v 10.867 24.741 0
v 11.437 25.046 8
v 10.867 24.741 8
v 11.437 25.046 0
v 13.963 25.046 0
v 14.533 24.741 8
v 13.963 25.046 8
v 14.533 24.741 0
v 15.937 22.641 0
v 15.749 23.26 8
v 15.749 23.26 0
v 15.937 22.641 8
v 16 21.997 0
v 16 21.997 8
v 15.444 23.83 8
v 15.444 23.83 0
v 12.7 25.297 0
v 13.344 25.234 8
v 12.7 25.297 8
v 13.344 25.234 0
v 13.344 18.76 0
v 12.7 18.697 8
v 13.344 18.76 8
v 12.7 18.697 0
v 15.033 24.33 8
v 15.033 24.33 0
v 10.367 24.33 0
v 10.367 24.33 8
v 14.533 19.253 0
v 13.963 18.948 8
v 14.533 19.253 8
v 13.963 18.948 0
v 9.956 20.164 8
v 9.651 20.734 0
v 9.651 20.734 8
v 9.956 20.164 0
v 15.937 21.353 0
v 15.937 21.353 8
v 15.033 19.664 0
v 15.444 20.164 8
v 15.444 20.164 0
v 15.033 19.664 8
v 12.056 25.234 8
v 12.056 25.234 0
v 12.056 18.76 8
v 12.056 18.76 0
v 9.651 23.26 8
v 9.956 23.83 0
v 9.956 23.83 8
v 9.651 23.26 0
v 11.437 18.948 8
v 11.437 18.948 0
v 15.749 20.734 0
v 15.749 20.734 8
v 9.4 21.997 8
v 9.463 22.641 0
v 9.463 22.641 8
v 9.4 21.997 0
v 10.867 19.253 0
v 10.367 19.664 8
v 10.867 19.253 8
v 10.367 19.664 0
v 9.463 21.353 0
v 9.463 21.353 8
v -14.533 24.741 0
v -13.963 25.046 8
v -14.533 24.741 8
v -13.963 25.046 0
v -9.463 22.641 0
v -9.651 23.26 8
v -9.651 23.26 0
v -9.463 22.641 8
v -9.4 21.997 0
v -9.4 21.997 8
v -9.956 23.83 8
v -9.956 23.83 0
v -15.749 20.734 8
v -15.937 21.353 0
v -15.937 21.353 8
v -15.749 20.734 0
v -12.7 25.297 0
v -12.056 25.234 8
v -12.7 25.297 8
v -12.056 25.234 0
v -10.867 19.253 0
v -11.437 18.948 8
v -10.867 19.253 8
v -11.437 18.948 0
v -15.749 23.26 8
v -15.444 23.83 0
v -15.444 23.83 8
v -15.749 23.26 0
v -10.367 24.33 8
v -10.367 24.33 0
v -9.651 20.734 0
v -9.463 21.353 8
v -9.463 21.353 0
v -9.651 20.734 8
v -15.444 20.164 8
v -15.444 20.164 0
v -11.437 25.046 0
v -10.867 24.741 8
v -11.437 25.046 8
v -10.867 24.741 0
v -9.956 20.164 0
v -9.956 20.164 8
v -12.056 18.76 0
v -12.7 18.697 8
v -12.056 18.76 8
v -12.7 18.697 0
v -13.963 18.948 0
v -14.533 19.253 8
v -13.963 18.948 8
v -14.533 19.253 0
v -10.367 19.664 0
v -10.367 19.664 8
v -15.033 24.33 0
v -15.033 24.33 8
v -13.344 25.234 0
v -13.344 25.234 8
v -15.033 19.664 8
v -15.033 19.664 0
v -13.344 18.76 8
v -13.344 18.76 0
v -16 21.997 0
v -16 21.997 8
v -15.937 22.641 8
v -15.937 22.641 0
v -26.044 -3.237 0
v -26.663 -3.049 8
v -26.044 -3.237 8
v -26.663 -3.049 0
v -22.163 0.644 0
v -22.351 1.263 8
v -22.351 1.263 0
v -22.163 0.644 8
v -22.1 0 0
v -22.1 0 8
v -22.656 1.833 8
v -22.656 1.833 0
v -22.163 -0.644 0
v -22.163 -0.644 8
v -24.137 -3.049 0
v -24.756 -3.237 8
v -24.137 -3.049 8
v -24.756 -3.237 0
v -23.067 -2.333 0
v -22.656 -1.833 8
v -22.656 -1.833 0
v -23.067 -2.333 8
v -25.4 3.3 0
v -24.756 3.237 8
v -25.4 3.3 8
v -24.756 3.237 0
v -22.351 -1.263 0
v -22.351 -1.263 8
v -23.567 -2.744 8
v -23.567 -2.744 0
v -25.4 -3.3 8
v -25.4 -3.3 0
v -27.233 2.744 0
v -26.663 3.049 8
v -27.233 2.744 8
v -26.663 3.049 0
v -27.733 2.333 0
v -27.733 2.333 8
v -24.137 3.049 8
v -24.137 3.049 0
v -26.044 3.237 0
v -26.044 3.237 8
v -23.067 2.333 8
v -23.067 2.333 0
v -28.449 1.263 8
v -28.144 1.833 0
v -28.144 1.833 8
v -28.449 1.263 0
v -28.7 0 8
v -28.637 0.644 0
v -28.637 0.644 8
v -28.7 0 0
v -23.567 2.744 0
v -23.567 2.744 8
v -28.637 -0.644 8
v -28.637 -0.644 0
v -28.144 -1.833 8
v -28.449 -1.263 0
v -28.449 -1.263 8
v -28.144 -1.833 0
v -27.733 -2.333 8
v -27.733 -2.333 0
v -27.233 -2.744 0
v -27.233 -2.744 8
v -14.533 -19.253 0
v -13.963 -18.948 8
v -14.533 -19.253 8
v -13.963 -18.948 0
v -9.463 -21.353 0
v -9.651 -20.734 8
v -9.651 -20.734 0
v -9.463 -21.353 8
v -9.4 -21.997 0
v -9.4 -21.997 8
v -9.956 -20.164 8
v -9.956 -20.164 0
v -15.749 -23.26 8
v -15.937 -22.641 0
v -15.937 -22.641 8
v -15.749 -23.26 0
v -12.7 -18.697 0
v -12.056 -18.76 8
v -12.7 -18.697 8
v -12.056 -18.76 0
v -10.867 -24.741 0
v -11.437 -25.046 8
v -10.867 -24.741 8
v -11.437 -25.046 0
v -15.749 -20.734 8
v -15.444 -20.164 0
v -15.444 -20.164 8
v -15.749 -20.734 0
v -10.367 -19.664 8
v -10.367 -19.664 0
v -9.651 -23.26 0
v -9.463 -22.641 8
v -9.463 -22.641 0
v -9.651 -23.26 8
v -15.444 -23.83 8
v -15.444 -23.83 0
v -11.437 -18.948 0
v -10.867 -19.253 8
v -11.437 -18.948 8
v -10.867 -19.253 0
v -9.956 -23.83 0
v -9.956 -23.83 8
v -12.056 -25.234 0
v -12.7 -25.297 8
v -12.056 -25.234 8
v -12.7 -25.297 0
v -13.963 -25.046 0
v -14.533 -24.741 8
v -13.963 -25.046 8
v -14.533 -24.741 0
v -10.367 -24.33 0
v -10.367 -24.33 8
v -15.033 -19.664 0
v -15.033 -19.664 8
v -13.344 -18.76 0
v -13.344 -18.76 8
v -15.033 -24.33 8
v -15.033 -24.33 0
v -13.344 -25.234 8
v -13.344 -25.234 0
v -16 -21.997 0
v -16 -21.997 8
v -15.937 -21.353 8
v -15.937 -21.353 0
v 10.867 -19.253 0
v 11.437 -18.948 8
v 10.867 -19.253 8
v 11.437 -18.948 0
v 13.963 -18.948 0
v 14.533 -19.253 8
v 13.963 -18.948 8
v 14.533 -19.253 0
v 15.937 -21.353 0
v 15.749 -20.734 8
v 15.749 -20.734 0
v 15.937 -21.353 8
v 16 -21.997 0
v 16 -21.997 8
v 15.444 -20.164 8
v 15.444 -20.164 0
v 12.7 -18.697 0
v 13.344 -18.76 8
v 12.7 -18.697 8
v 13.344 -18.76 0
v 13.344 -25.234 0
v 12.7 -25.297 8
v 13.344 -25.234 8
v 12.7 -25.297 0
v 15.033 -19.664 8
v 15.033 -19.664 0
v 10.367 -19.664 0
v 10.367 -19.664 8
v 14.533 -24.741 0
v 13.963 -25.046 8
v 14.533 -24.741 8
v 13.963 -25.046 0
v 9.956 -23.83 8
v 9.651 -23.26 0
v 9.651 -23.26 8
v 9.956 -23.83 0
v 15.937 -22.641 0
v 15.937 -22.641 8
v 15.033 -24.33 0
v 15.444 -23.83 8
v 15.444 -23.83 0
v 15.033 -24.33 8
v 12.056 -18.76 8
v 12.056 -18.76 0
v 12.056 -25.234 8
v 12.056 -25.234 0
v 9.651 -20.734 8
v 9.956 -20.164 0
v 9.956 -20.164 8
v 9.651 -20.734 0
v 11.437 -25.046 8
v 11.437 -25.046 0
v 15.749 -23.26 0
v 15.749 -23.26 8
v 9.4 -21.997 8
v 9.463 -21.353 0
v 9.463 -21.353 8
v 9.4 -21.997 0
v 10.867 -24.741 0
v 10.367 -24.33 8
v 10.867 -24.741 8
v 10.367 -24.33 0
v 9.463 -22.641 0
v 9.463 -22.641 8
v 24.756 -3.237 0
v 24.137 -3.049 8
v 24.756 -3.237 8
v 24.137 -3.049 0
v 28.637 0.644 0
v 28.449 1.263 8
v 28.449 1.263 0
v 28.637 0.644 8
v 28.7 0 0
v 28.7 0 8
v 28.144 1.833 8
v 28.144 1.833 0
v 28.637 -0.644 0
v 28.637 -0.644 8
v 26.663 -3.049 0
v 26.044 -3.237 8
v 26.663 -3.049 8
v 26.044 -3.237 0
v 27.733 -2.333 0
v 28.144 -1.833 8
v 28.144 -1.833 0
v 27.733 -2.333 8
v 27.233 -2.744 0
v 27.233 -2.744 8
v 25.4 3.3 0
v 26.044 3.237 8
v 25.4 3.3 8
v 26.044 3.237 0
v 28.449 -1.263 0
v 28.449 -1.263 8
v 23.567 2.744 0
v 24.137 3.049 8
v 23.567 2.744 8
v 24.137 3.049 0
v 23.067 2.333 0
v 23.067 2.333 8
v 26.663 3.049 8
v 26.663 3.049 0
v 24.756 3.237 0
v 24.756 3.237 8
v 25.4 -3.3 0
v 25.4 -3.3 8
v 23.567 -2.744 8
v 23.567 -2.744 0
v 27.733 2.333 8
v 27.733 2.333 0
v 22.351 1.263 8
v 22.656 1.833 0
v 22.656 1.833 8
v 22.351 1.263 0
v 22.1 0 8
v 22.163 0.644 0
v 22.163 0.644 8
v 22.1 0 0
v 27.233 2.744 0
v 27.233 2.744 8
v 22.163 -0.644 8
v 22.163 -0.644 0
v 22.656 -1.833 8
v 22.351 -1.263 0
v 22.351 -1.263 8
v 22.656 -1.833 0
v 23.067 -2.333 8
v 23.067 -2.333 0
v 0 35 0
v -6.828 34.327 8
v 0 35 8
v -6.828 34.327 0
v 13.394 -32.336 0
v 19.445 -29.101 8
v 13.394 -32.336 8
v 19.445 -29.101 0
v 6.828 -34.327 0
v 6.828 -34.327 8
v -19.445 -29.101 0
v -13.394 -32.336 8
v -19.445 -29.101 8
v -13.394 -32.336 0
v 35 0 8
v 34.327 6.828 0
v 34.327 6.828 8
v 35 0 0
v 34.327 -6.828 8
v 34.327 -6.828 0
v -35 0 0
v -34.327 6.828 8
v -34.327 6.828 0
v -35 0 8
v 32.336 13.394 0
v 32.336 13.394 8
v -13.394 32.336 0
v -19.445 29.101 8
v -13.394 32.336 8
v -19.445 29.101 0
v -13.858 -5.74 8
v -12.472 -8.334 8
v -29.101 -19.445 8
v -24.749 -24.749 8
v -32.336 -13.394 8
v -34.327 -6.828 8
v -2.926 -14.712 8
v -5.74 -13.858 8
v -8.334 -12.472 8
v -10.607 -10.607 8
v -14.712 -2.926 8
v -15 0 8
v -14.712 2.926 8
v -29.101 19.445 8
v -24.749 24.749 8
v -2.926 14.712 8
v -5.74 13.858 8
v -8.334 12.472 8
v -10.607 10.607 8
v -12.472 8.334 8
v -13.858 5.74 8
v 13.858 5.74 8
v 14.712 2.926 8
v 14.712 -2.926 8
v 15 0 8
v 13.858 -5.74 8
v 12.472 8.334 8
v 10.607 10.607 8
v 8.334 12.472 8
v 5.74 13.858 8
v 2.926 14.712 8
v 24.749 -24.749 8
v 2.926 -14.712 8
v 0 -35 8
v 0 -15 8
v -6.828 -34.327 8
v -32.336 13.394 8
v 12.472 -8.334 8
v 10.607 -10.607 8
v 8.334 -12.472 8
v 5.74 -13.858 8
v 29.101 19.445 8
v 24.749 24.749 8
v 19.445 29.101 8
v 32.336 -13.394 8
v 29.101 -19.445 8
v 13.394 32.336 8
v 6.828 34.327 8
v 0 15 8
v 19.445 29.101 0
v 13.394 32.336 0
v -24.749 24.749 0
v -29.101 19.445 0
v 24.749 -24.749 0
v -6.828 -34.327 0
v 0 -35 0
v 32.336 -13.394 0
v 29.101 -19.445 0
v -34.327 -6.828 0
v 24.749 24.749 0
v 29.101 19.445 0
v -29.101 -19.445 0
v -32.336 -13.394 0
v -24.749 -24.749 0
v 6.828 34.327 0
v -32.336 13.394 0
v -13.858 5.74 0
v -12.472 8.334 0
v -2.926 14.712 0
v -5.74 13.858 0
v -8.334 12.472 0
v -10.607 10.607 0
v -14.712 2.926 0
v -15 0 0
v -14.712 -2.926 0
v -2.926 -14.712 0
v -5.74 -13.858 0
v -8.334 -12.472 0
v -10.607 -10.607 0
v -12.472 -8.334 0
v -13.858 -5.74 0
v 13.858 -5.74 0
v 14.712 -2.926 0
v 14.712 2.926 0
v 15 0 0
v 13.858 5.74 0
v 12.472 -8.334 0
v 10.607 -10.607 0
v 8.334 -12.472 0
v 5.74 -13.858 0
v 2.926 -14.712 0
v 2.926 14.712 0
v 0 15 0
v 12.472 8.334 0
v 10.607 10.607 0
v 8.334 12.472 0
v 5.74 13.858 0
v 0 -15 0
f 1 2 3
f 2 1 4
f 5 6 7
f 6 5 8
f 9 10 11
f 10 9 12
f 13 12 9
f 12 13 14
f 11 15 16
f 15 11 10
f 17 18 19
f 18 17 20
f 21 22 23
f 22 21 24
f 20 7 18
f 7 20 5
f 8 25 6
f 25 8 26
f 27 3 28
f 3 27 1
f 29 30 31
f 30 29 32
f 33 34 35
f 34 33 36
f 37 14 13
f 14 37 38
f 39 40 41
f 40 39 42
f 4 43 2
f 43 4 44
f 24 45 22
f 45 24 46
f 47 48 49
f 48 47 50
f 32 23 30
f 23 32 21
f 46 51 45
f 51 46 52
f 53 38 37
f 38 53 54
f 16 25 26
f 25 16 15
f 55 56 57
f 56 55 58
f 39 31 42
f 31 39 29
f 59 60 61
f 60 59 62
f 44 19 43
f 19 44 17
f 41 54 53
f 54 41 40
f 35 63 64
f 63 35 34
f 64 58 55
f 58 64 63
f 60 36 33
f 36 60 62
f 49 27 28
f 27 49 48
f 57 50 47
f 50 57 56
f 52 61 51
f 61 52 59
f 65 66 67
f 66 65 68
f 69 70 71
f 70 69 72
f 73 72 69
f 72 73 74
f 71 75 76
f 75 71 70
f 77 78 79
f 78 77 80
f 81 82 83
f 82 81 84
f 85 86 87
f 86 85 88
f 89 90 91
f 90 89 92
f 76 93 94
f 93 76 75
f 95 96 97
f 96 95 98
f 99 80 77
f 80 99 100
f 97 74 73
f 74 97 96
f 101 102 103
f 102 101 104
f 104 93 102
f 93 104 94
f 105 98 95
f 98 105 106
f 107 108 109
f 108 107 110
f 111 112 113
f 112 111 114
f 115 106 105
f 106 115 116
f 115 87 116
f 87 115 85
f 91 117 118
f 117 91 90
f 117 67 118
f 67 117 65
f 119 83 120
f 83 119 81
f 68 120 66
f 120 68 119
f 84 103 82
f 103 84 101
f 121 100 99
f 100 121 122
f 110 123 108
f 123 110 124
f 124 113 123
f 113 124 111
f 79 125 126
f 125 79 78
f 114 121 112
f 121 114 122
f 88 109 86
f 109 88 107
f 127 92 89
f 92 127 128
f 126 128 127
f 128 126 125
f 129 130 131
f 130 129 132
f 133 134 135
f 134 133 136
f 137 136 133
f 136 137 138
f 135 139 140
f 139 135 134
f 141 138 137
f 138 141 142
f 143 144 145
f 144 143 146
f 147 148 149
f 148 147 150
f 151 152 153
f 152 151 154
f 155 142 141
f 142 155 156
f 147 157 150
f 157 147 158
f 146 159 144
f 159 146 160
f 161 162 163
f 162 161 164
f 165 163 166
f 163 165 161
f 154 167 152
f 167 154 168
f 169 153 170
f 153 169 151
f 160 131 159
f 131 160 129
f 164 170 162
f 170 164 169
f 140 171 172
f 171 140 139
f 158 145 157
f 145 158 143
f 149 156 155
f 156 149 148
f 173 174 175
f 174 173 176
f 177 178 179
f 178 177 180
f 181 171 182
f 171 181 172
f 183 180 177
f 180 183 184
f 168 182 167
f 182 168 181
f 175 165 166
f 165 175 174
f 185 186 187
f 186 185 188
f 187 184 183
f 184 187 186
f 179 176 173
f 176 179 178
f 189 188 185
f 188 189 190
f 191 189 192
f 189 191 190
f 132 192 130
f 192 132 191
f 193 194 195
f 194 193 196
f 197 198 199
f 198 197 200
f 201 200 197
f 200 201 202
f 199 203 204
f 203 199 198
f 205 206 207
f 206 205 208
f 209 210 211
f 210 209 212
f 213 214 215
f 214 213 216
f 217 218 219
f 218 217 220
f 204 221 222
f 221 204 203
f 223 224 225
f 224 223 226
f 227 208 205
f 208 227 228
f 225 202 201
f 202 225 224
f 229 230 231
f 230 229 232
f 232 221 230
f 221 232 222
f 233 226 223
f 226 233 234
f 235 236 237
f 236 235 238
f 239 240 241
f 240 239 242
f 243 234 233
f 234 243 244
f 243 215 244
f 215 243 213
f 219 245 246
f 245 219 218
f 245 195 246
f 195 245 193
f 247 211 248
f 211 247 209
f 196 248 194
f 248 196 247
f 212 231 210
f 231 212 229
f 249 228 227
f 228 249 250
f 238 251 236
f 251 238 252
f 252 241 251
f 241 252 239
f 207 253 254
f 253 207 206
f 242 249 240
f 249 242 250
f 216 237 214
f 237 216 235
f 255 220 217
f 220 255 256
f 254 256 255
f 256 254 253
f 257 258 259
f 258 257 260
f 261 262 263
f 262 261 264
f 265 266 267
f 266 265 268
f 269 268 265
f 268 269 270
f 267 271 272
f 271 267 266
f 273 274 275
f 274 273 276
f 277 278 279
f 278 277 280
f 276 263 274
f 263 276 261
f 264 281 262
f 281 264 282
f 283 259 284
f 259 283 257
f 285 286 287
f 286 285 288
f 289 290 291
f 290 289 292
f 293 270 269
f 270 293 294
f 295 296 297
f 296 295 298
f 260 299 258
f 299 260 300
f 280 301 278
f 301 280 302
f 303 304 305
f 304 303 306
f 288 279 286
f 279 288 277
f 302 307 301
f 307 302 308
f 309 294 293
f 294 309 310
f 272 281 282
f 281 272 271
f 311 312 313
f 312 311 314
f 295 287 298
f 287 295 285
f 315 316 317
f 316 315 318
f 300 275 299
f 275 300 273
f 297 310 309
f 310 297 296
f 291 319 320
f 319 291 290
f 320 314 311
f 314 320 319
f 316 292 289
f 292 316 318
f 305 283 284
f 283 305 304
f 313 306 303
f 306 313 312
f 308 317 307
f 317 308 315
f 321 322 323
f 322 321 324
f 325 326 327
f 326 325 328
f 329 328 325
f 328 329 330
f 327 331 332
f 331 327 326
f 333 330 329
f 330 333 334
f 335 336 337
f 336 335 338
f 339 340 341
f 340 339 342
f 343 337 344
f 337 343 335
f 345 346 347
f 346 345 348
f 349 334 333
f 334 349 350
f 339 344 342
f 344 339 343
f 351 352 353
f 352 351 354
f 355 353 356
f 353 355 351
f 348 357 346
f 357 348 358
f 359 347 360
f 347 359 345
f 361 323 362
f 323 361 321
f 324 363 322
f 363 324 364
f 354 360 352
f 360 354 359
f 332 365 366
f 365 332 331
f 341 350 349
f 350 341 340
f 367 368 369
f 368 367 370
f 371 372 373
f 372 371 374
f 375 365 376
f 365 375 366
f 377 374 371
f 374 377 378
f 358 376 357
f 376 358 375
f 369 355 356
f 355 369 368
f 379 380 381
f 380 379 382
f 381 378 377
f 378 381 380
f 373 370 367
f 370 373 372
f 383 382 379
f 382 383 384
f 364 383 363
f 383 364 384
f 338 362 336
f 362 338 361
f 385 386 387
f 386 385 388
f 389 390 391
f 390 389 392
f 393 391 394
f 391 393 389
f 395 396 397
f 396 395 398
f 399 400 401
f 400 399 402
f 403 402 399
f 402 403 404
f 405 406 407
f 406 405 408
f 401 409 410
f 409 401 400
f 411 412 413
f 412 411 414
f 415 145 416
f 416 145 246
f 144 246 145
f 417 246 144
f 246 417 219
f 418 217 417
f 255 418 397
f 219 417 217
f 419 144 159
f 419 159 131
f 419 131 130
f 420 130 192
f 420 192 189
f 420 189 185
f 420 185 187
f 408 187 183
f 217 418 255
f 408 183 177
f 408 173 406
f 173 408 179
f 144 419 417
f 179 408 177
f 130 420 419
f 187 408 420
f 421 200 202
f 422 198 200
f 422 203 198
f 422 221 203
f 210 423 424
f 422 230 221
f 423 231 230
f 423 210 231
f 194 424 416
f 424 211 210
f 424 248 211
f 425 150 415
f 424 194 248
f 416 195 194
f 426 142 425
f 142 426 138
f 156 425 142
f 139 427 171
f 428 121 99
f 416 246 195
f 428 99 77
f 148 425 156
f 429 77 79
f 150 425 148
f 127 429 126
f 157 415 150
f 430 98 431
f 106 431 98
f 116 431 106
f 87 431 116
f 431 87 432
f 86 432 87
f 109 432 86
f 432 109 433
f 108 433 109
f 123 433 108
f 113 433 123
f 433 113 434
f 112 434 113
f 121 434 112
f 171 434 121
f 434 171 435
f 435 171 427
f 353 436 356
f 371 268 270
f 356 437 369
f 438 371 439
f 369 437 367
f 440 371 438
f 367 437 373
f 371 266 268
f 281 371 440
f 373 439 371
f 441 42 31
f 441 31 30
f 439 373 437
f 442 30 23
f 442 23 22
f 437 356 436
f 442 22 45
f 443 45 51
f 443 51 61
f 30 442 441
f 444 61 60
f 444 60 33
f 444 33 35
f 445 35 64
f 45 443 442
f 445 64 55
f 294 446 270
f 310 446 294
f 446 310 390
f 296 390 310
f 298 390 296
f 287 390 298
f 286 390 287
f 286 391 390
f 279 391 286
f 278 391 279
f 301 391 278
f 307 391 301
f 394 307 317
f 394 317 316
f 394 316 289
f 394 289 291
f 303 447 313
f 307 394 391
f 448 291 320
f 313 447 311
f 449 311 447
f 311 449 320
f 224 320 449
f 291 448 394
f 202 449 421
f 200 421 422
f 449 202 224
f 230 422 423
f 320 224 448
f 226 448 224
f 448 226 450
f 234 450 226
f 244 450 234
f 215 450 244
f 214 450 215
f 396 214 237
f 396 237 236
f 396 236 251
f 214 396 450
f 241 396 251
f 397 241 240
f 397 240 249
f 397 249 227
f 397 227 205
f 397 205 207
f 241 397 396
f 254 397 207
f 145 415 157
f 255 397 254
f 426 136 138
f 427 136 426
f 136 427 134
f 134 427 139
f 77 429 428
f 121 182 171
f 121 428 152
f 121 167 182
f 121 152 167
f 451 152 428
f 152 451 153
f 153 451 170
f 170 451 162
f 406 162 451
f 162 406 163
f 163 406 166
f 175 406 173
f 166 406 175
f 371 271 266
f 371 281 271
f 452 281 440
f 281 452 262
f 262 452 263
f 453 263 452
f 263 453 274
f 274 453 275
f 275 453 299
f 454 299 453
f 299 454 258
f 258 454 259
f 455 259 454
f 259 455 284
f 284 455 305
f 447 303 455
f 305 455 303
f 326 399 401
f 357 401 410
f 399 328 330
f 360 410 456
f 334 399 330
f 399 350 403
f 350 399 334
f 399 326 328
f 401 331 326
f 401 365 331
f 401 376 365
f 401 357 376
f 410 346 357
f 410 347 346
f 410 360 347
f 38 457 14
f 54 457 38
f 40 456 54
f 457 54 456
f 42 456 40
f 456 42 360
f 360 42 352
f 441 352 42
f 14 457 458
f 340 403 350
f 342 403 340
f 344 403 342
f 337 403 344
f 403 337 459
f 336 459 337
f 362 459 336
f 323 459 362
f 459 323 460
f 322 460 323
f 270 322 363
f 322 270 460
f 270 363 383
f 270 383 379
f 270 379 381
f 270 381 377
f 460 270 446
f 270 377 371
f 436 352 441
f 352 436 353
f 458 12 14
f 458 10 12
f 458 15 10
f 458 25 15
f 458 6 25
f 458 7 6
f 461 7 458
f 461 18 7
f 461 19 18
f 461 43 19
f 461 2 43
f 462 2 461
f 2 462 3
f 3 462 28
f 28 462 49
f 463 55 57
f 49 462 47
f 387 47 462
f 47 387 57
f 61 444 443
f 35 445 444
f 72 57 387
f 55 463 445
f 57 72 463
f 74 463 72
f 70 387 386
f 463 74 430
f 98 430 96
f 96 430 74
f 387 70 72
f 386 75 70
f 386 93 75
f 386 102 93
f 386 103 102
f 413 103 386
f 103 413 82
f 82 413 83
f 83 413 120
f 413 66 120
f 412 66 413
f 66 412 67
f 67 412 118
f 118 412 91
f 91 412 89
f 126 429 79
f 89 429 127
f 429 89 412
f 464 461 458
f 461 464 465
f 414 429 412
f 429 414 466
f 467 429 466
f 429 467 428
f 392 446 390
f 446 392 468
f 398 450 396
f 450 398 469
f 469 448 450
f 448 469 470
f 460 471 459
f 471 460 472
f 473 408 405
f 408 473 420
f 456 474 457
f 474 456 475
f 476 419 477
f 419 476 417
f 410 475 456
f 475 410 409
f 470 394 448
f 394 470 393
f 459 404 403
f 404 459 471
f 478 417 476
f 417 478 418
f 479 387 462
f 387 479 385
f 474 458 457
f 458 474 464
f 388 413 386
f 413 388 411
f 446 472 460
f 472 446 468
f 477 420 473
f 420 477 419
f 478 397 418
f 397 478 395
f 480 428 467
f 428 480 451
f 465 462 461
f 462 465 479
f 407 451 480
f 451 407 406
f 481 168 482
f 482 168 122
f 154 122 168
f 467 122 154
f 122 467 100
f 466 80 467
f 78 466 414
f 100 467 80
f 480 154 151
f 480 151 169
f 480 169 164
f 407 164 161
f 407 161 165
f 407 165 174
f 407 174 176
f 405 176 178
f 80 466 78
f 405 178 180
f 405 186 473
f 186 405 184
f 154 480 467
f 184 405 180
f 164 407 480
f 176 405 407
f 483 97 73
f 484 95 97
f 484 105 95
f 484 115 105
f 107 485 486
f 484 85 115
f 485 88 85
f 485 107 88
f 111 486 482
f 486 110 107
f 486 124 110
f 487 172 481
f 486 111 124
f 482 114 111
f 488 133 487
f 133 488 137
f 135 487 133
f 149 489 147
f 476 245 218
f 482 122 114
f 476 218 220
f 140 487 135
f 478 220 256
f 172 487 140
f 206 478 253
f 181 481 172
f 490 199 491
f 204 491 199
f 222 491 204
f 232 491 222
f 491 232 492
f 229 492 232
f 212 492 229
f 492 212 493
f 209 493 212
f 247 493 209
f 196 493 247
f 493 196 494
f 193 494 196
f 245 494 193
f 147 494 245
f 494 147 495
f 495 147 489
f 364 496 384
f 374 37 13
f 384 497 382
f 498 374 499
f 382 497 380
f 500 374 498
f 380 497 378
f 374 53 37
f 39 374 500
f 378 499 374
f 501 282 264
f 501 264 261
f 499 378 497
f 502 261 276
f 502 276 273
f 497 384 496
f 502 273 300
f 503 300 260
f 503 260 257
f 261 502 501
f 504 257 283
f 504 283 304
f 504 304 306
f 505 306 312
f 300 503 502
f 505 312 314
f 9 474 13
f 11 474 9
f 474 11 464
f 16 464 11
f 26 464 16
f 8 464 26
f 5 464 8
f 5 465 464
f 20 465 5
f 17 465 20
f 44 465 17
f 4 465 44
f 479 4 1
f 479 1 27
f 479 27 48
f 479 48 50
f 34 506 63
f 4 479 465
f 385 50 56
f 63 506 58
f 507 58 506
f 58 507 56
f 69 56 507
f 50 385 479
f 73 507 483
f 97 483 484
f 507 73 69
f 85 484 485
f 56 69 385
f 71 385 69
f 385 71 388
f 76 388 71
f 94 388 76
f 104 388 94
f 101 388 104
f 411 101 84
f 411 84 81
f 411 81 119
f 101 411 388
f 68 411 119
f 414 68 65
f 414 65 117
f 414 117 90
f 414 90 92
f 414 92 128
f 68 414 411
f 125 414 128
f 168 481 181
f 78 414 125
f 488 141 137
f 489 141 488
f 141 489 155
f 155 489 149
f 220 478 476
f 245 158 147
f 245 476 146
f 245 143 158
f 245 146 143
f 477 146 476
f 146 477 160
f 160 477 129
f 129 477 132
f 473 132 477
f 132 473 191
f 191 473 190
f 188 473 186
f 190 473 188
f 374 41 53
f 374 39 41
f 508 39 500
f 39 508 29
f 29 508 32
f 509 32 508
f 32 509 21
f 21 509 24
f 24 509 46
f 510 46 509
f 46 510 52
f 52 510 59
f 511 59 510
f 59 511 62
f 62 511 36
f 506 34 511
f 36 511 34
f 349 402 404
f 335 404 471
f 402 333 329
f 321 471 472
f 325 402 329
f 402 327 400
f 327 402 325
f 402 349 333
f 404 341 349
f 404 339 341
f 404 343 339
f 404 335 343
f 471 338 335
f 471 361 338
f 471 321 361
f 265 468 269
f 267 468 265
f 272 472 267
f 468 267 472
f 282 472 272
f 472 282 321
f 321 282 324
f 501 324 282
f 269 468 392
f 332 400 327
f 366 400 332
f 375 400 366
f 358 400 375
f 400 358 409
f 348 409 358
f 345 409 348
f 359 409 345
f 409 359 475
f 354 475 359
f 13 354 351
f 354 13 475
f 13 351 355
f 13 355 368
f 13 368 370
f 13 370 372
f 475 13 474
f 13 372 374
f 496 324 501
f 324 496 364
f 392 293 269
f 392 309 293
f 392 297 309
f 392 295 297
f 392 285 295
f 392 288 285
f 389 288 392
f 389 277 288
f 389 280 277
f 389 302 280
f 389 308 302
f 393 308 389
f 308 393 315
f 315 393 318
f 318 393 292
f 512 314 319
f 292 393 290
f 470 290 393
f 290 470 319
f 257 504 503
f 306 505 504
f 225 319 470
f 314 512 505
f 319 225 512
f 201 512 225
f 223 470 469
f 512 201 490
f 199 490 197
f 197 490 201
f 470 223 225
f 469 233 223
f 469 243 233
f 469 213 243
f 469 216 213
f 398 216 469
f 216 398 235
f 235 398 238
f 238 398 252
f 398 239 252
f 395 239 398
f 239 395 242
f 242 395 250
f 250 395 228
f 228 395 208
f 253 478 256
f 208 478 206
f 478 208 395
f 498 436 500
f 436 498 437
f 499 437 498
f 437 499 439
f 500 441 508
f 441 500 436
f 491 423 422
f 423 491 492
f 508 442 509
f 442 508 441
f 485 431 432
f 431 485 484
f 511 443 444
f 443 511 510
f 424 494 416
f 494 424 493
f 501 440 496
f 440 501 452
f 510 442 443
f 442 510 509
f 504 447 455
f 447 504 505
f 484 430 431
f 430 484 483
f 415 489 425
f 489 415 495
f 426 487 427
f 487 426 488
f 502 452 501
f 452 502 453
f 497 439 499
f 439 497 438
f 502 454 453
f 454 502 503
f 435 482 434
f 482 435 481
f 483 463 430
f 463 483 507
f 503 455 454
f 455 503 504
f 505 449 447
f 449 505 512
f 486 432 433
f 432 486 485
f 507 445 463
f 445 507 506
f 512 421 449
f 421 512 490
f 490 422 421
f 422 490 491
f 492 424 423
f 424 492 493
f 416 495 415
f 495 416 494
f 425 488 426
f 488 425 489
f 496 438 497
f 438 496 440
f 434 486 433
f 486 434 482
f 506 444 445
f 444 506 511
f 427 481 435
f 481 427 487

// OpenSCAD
$fn = 32;

// ----------------------------------------------------------------------
// Flange Ø70 x 8
// 6 holes on a Ø50.8 bolt circle, bolted joints
// ----------------------------------------------------------------------

// --- parameters (mm) ---
flange_d = 70;   // outside diameter of the flange
thickness = 8;   // flange thickness
holes = 6;       // number of bolt holes
pcd = 50.8;      // bolt circle diameter
start_deg = 60;  // angle of the first hole, from +X
hole_d = 6.6;    // bolt hole diameter
bore_d = 30;     // central through bore
hub_d = 42;      // hub outside diameter
hub_h = 0;       // hub height above the flange face (0 = no hub)

// --- derived feature positions (mm) ---
height = thickness + hub_h;  // = 8   overall height of the part
pcd_r = pcd / 2;             // = 25.4   bolt circle radius
hole_step = 360 / holes;     // = 60   angular pitch
feature_centers = [
  [pcd_r * cos(start_deg + 0 * hole_step), pcd_r * sin(start_deg + 0 * hole_step)],
  [pcd_r * cos(start_deg + 1 * hole_step), pcd_r * sin(start_deg + 1 * hole_step)],
  [pcd_r * cos(start_deg + 2 * hole_step), pcd_r * sin(start_deg + 2 * hole_step)],
  [pcd_r * cos(start_deg + 3 * hole_step), pcd_r * sin(start_deg + 3 * hole_step)],
  [pcd_r * cos(start_deg + 4 * hole_step), pcd_r * sin(start_deg + 4 * hole_step)],
  [pcd_r * cos(start_deg + 5 * hole_step), pcd_r * sin(start_deg + 5 * hole_step)]
];   // bolt hole centres on the pitch circle

// flange disc, every hole and the bore cut straight through
difference() {
  union() {
    cylinder(d = flange_d, h = thickness);
  }
  translate([0, 0, -1]) cylinder(d = bore_d, h = height + 2);  // bore, through
  for (centre = feature_centers)
    translate([centre[0], centre[1], -1]) cylinder(d = hole_d, h = thickness + 2);
}
